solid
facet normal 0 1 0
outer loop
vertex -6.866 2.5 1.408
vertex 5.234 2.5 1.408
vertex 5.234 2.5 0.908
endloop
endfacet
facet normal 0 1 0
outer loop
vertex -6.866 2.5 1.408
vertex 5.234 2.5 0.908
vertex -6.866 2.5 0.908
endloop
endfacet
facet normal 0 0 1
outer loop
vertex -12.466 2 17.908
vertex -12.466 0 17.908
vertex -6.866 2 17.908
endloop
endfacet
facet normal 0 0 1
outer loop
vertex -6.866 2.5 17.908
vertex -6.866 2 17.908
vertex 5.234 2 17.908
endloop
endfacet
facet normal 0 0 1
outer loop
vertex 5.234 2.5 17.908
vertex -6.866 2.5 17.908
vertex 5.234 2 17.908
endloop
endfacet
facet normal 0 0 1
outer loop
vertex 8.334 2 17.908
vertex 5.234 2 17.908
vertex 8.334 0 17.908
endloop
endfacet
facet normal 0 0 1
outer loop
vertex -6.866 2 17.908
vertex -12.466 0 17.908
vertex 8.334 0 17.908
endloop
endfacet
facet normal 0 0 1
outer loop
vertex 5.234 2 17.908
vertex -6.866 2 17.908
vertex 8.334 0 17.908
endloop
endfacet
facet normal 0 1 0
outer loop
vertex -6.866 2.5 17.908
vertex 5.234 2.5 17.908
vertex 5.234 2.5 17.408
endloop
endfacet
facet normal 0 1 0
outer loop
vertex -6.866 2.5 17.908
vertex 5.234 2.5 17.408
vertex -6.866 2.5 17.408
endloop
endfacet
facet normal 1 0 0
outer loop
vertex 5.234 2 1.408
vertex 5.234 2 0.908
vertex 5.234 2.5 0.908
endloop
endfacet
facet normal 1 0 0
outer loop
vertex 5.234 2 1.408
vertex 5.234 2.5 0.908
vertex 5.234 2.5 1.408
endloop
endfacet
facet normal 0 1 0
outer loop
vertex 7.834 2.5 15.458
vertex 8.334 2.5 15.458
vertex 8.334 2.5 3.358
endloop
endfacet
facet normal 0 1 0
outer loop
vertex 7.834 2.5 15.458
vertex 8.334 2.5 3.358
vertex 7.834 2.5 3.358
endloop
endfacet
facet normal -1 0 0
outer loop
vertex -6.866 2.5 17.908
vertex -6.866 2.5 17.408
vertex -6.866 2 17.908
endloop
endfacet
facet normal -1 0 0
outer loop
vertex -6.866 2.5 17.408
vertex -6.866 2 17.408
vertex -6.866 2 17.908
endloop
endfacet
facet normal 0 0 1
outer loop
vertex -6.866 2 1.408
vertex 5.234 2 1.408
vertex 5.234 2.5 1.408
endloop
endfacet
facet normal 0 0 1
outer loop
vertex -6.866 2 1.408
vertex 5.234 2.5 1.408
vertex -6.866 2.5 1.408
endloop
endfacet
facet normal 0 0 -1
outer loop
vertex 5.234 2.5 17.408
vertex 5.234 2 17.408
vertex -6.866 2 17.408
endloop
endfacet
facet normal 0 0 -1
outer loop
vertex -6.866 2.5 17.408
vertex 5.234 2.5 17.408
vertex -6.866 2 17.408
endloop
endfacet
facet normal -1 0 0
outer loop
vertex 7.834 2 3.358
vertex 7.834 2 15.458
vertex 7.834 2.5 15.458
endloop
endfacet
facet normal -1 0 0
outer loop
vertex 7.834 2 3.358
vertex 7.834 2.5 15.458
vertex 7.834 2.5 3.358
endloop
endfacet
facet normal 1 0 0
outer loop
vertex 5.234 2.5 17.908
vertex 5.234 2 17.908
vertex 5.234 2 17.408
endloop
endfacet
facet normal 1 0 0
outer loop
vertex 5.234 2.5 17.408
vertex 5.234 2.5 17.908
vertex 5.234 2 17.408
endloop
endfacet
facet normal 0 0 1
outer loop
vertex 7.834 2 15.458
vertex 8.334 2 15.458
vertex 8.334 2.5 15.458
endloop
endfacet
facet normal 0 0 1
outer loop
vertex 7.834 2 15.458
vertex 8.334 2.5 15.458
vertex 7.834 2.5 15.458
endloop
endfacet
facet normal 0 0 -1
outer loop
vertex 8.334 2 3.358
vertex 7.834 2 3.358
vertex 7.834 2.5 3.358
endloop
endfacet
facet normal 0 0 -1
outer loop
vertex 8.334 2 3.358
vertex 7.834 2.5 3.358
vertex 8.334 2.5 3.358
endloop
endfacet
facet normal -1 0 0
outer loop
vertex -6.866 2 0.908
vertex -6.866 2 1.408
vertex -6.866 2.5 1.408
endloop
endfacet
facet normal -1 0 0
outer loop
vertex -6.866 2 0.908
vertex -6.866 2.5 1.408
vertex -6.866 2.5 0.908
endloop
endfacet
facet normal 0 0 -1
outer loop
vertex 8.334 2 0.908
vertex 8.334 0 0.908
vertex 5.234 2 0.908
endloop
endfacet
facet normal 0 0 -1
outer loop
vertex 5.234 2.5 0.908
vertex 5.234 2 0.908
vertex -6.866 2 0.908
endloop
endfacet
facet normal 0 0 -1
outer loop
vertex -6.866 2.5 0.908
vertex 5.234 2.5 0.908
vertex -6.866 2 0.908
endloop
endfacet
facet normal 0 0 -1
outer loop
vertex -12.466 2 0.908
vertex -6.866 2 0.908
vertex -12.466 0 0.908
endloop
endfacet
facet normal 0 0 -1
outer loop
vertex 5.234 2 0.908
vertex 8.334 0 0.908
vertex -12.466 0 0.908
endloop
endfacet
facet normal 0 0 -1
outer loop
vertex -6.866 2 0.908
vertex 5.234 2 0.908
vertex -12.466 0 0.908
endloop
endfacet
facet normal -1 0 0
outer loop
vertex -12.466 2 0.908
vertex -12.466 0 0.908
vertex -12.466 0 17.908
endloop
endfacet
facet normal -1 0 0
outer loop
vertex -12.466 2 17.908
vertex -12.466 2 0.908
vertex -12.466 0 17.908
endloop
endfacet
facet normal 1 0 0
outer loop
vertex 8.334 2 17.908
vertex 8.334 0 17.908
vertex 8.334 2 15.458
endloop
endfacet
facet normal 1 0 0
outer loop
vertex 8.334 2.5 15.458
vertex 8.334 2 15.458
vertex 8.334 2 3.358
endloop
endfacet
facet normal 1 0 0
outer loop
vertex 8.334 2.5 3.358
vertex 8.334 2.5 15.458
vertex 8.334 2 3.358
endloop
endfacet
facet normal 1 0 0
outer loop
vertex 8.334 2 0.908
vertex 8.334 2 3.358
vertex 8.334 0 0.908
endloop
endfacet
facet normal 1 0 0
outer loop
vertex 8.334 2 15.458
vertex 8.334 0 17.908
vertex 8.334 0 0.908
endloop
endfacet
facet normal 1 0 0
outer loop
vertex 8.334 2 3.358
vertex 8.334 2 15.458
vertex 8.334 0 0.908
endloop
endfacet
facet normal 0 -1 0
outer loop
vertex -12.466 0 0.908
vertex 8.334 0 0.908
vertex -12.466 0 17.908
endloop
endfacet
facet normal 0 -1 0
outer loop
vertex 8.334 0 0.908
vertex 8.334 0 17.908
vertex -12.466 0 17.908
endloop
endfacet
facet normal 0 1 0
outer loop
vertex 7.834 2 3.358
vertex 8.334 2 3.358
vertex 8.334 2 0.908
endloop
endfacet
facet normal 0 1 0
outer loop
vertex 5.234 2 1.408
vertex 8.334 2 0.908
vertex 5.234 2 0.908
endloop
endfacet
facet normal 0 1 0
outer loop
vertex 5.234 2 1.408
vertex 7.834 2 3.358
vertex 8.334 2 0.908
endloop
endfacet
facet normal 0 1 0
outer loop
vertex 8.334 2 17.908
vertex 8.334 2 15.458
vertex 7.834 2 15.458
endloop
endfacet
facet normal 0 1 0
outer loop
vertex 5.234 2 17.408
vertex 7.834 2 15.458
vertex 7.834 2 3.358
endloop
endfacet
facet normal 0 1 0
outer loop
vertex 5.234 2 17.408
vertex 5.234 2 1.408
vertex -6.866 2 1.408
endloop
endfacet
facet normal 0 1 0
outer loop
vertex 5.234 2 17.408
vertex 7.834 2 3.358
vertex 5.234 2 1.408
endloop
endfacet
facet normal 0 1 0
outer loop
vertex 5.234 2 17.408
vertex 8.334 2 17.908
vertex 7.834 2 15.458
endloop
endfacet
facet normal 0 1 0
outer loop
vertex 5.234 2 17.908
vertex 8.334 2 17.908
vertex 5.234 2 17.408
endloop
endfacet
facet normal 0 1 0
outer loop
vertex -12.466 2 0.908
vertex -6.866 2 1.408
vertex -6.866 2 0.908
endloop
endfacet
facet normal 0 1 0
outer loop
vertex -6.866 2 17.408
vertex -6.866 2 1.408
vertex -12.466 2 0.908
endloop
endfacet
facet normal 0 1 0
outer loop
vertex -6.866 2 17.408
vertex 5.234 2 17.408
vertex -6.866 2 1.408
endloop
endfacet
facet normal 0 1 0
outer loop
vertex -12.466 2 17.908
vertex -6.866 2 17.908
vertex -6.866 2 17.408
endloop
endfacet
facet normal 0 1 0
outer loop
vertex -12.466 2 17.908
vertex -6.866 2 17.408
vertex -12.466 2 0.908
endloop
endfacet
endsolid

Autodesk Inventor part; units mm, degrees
ref_plane "YZ Plane" through (0, 0, 0) normal (1, 0, 0) x (0, 1, 0)
ref_plane "XZ Plane" through (0, 0, 0) normal (0, 1, 0) x (-1, 0, 0)
ref_plane "XY Plane" through (0, 0, 0) normal (0, 0, 1) x (1, 0, 0)
sketch "Sketch1" plane through (0, 0, 0) normal (0, 1, 0) x (-1, 0, 0)
  line L0 (12.4664, 17.9083) -> (-8.3336, 17.9083)
  line L1 (-8.3336, 17.9083) -> (-8.3336, 0.9083)
  line L2 (-8.3336, 0.9083) -> (12.4664, 0.9083)
  line L3 (12.4664, 0.9083) -> (12.4664, 17.9083)
  line L4 (-8.3336, 15.4583) -> (-7.8336, 15.4583)
  line L5 (-7.8336, 15.4583) -> (-7.8336, 3.3583)
  line L6 (-7.8336, 3.3583) -> (-8.3336, 3.3583)
  line L7 (-8.3336, 3.3583) -> (-8.3336, 15.4583)
  line L8 (6.8664, 17.9083) -> (-5.2336, 17.9083)
  line L9 (-5.2336, 17.9083) -> (-5.2336, 17.4083)
  line L10 (-5.2336, 17.4083) -> (6.8664, 17.4083)
  line L11 (6.8664, 17.4083) -> (6.8664, 17.9083)
  line L12 (6.8664, 0.9083) -> (-5.2336, 0.9083)
  line L13 (-5.2336, 0.9083) -> (-5.2336, 1.4083)
  line L14 (-5.2336, 1.4083) -> (6.8664, 1.4083)
  line L15 (6.8664, 1.4083) -> (6.8664, 0.9083)
  point P0 (0, 0)
  dimension "d0" = 20.8
  dimension "d1" = 17
  dimension "d2" = 0.5
  dimension "d3" = 2.45
  dimension "d4" = 2.45
  dimension "d5" = 3.1
  dimension "d6" = 5.6
  dimension "d7" = 0.5
  dimension "d8" = 0.5
extrude "Extrusion1" add sketch "Sketch1" along normal blind 2 contours L3 L2 L15 L14 L13 L1 L6 L5 L4 L0 L9 L10 L11
extrude "Extrusion2" add sketch "Sketch1" along normal blind 2.5 contours L11 L10 L9 L0
extrude "Extrusion3" add sketch "Sketch1" along normal blind 2.5 contours L4 L5 L6 L1
extrude "Extrusion4" add sketch "Sketch1" along normal blind 2.5 contours L2 L13 L14 L15
equation "\"d4\" = d3"
properties part number "čip"
